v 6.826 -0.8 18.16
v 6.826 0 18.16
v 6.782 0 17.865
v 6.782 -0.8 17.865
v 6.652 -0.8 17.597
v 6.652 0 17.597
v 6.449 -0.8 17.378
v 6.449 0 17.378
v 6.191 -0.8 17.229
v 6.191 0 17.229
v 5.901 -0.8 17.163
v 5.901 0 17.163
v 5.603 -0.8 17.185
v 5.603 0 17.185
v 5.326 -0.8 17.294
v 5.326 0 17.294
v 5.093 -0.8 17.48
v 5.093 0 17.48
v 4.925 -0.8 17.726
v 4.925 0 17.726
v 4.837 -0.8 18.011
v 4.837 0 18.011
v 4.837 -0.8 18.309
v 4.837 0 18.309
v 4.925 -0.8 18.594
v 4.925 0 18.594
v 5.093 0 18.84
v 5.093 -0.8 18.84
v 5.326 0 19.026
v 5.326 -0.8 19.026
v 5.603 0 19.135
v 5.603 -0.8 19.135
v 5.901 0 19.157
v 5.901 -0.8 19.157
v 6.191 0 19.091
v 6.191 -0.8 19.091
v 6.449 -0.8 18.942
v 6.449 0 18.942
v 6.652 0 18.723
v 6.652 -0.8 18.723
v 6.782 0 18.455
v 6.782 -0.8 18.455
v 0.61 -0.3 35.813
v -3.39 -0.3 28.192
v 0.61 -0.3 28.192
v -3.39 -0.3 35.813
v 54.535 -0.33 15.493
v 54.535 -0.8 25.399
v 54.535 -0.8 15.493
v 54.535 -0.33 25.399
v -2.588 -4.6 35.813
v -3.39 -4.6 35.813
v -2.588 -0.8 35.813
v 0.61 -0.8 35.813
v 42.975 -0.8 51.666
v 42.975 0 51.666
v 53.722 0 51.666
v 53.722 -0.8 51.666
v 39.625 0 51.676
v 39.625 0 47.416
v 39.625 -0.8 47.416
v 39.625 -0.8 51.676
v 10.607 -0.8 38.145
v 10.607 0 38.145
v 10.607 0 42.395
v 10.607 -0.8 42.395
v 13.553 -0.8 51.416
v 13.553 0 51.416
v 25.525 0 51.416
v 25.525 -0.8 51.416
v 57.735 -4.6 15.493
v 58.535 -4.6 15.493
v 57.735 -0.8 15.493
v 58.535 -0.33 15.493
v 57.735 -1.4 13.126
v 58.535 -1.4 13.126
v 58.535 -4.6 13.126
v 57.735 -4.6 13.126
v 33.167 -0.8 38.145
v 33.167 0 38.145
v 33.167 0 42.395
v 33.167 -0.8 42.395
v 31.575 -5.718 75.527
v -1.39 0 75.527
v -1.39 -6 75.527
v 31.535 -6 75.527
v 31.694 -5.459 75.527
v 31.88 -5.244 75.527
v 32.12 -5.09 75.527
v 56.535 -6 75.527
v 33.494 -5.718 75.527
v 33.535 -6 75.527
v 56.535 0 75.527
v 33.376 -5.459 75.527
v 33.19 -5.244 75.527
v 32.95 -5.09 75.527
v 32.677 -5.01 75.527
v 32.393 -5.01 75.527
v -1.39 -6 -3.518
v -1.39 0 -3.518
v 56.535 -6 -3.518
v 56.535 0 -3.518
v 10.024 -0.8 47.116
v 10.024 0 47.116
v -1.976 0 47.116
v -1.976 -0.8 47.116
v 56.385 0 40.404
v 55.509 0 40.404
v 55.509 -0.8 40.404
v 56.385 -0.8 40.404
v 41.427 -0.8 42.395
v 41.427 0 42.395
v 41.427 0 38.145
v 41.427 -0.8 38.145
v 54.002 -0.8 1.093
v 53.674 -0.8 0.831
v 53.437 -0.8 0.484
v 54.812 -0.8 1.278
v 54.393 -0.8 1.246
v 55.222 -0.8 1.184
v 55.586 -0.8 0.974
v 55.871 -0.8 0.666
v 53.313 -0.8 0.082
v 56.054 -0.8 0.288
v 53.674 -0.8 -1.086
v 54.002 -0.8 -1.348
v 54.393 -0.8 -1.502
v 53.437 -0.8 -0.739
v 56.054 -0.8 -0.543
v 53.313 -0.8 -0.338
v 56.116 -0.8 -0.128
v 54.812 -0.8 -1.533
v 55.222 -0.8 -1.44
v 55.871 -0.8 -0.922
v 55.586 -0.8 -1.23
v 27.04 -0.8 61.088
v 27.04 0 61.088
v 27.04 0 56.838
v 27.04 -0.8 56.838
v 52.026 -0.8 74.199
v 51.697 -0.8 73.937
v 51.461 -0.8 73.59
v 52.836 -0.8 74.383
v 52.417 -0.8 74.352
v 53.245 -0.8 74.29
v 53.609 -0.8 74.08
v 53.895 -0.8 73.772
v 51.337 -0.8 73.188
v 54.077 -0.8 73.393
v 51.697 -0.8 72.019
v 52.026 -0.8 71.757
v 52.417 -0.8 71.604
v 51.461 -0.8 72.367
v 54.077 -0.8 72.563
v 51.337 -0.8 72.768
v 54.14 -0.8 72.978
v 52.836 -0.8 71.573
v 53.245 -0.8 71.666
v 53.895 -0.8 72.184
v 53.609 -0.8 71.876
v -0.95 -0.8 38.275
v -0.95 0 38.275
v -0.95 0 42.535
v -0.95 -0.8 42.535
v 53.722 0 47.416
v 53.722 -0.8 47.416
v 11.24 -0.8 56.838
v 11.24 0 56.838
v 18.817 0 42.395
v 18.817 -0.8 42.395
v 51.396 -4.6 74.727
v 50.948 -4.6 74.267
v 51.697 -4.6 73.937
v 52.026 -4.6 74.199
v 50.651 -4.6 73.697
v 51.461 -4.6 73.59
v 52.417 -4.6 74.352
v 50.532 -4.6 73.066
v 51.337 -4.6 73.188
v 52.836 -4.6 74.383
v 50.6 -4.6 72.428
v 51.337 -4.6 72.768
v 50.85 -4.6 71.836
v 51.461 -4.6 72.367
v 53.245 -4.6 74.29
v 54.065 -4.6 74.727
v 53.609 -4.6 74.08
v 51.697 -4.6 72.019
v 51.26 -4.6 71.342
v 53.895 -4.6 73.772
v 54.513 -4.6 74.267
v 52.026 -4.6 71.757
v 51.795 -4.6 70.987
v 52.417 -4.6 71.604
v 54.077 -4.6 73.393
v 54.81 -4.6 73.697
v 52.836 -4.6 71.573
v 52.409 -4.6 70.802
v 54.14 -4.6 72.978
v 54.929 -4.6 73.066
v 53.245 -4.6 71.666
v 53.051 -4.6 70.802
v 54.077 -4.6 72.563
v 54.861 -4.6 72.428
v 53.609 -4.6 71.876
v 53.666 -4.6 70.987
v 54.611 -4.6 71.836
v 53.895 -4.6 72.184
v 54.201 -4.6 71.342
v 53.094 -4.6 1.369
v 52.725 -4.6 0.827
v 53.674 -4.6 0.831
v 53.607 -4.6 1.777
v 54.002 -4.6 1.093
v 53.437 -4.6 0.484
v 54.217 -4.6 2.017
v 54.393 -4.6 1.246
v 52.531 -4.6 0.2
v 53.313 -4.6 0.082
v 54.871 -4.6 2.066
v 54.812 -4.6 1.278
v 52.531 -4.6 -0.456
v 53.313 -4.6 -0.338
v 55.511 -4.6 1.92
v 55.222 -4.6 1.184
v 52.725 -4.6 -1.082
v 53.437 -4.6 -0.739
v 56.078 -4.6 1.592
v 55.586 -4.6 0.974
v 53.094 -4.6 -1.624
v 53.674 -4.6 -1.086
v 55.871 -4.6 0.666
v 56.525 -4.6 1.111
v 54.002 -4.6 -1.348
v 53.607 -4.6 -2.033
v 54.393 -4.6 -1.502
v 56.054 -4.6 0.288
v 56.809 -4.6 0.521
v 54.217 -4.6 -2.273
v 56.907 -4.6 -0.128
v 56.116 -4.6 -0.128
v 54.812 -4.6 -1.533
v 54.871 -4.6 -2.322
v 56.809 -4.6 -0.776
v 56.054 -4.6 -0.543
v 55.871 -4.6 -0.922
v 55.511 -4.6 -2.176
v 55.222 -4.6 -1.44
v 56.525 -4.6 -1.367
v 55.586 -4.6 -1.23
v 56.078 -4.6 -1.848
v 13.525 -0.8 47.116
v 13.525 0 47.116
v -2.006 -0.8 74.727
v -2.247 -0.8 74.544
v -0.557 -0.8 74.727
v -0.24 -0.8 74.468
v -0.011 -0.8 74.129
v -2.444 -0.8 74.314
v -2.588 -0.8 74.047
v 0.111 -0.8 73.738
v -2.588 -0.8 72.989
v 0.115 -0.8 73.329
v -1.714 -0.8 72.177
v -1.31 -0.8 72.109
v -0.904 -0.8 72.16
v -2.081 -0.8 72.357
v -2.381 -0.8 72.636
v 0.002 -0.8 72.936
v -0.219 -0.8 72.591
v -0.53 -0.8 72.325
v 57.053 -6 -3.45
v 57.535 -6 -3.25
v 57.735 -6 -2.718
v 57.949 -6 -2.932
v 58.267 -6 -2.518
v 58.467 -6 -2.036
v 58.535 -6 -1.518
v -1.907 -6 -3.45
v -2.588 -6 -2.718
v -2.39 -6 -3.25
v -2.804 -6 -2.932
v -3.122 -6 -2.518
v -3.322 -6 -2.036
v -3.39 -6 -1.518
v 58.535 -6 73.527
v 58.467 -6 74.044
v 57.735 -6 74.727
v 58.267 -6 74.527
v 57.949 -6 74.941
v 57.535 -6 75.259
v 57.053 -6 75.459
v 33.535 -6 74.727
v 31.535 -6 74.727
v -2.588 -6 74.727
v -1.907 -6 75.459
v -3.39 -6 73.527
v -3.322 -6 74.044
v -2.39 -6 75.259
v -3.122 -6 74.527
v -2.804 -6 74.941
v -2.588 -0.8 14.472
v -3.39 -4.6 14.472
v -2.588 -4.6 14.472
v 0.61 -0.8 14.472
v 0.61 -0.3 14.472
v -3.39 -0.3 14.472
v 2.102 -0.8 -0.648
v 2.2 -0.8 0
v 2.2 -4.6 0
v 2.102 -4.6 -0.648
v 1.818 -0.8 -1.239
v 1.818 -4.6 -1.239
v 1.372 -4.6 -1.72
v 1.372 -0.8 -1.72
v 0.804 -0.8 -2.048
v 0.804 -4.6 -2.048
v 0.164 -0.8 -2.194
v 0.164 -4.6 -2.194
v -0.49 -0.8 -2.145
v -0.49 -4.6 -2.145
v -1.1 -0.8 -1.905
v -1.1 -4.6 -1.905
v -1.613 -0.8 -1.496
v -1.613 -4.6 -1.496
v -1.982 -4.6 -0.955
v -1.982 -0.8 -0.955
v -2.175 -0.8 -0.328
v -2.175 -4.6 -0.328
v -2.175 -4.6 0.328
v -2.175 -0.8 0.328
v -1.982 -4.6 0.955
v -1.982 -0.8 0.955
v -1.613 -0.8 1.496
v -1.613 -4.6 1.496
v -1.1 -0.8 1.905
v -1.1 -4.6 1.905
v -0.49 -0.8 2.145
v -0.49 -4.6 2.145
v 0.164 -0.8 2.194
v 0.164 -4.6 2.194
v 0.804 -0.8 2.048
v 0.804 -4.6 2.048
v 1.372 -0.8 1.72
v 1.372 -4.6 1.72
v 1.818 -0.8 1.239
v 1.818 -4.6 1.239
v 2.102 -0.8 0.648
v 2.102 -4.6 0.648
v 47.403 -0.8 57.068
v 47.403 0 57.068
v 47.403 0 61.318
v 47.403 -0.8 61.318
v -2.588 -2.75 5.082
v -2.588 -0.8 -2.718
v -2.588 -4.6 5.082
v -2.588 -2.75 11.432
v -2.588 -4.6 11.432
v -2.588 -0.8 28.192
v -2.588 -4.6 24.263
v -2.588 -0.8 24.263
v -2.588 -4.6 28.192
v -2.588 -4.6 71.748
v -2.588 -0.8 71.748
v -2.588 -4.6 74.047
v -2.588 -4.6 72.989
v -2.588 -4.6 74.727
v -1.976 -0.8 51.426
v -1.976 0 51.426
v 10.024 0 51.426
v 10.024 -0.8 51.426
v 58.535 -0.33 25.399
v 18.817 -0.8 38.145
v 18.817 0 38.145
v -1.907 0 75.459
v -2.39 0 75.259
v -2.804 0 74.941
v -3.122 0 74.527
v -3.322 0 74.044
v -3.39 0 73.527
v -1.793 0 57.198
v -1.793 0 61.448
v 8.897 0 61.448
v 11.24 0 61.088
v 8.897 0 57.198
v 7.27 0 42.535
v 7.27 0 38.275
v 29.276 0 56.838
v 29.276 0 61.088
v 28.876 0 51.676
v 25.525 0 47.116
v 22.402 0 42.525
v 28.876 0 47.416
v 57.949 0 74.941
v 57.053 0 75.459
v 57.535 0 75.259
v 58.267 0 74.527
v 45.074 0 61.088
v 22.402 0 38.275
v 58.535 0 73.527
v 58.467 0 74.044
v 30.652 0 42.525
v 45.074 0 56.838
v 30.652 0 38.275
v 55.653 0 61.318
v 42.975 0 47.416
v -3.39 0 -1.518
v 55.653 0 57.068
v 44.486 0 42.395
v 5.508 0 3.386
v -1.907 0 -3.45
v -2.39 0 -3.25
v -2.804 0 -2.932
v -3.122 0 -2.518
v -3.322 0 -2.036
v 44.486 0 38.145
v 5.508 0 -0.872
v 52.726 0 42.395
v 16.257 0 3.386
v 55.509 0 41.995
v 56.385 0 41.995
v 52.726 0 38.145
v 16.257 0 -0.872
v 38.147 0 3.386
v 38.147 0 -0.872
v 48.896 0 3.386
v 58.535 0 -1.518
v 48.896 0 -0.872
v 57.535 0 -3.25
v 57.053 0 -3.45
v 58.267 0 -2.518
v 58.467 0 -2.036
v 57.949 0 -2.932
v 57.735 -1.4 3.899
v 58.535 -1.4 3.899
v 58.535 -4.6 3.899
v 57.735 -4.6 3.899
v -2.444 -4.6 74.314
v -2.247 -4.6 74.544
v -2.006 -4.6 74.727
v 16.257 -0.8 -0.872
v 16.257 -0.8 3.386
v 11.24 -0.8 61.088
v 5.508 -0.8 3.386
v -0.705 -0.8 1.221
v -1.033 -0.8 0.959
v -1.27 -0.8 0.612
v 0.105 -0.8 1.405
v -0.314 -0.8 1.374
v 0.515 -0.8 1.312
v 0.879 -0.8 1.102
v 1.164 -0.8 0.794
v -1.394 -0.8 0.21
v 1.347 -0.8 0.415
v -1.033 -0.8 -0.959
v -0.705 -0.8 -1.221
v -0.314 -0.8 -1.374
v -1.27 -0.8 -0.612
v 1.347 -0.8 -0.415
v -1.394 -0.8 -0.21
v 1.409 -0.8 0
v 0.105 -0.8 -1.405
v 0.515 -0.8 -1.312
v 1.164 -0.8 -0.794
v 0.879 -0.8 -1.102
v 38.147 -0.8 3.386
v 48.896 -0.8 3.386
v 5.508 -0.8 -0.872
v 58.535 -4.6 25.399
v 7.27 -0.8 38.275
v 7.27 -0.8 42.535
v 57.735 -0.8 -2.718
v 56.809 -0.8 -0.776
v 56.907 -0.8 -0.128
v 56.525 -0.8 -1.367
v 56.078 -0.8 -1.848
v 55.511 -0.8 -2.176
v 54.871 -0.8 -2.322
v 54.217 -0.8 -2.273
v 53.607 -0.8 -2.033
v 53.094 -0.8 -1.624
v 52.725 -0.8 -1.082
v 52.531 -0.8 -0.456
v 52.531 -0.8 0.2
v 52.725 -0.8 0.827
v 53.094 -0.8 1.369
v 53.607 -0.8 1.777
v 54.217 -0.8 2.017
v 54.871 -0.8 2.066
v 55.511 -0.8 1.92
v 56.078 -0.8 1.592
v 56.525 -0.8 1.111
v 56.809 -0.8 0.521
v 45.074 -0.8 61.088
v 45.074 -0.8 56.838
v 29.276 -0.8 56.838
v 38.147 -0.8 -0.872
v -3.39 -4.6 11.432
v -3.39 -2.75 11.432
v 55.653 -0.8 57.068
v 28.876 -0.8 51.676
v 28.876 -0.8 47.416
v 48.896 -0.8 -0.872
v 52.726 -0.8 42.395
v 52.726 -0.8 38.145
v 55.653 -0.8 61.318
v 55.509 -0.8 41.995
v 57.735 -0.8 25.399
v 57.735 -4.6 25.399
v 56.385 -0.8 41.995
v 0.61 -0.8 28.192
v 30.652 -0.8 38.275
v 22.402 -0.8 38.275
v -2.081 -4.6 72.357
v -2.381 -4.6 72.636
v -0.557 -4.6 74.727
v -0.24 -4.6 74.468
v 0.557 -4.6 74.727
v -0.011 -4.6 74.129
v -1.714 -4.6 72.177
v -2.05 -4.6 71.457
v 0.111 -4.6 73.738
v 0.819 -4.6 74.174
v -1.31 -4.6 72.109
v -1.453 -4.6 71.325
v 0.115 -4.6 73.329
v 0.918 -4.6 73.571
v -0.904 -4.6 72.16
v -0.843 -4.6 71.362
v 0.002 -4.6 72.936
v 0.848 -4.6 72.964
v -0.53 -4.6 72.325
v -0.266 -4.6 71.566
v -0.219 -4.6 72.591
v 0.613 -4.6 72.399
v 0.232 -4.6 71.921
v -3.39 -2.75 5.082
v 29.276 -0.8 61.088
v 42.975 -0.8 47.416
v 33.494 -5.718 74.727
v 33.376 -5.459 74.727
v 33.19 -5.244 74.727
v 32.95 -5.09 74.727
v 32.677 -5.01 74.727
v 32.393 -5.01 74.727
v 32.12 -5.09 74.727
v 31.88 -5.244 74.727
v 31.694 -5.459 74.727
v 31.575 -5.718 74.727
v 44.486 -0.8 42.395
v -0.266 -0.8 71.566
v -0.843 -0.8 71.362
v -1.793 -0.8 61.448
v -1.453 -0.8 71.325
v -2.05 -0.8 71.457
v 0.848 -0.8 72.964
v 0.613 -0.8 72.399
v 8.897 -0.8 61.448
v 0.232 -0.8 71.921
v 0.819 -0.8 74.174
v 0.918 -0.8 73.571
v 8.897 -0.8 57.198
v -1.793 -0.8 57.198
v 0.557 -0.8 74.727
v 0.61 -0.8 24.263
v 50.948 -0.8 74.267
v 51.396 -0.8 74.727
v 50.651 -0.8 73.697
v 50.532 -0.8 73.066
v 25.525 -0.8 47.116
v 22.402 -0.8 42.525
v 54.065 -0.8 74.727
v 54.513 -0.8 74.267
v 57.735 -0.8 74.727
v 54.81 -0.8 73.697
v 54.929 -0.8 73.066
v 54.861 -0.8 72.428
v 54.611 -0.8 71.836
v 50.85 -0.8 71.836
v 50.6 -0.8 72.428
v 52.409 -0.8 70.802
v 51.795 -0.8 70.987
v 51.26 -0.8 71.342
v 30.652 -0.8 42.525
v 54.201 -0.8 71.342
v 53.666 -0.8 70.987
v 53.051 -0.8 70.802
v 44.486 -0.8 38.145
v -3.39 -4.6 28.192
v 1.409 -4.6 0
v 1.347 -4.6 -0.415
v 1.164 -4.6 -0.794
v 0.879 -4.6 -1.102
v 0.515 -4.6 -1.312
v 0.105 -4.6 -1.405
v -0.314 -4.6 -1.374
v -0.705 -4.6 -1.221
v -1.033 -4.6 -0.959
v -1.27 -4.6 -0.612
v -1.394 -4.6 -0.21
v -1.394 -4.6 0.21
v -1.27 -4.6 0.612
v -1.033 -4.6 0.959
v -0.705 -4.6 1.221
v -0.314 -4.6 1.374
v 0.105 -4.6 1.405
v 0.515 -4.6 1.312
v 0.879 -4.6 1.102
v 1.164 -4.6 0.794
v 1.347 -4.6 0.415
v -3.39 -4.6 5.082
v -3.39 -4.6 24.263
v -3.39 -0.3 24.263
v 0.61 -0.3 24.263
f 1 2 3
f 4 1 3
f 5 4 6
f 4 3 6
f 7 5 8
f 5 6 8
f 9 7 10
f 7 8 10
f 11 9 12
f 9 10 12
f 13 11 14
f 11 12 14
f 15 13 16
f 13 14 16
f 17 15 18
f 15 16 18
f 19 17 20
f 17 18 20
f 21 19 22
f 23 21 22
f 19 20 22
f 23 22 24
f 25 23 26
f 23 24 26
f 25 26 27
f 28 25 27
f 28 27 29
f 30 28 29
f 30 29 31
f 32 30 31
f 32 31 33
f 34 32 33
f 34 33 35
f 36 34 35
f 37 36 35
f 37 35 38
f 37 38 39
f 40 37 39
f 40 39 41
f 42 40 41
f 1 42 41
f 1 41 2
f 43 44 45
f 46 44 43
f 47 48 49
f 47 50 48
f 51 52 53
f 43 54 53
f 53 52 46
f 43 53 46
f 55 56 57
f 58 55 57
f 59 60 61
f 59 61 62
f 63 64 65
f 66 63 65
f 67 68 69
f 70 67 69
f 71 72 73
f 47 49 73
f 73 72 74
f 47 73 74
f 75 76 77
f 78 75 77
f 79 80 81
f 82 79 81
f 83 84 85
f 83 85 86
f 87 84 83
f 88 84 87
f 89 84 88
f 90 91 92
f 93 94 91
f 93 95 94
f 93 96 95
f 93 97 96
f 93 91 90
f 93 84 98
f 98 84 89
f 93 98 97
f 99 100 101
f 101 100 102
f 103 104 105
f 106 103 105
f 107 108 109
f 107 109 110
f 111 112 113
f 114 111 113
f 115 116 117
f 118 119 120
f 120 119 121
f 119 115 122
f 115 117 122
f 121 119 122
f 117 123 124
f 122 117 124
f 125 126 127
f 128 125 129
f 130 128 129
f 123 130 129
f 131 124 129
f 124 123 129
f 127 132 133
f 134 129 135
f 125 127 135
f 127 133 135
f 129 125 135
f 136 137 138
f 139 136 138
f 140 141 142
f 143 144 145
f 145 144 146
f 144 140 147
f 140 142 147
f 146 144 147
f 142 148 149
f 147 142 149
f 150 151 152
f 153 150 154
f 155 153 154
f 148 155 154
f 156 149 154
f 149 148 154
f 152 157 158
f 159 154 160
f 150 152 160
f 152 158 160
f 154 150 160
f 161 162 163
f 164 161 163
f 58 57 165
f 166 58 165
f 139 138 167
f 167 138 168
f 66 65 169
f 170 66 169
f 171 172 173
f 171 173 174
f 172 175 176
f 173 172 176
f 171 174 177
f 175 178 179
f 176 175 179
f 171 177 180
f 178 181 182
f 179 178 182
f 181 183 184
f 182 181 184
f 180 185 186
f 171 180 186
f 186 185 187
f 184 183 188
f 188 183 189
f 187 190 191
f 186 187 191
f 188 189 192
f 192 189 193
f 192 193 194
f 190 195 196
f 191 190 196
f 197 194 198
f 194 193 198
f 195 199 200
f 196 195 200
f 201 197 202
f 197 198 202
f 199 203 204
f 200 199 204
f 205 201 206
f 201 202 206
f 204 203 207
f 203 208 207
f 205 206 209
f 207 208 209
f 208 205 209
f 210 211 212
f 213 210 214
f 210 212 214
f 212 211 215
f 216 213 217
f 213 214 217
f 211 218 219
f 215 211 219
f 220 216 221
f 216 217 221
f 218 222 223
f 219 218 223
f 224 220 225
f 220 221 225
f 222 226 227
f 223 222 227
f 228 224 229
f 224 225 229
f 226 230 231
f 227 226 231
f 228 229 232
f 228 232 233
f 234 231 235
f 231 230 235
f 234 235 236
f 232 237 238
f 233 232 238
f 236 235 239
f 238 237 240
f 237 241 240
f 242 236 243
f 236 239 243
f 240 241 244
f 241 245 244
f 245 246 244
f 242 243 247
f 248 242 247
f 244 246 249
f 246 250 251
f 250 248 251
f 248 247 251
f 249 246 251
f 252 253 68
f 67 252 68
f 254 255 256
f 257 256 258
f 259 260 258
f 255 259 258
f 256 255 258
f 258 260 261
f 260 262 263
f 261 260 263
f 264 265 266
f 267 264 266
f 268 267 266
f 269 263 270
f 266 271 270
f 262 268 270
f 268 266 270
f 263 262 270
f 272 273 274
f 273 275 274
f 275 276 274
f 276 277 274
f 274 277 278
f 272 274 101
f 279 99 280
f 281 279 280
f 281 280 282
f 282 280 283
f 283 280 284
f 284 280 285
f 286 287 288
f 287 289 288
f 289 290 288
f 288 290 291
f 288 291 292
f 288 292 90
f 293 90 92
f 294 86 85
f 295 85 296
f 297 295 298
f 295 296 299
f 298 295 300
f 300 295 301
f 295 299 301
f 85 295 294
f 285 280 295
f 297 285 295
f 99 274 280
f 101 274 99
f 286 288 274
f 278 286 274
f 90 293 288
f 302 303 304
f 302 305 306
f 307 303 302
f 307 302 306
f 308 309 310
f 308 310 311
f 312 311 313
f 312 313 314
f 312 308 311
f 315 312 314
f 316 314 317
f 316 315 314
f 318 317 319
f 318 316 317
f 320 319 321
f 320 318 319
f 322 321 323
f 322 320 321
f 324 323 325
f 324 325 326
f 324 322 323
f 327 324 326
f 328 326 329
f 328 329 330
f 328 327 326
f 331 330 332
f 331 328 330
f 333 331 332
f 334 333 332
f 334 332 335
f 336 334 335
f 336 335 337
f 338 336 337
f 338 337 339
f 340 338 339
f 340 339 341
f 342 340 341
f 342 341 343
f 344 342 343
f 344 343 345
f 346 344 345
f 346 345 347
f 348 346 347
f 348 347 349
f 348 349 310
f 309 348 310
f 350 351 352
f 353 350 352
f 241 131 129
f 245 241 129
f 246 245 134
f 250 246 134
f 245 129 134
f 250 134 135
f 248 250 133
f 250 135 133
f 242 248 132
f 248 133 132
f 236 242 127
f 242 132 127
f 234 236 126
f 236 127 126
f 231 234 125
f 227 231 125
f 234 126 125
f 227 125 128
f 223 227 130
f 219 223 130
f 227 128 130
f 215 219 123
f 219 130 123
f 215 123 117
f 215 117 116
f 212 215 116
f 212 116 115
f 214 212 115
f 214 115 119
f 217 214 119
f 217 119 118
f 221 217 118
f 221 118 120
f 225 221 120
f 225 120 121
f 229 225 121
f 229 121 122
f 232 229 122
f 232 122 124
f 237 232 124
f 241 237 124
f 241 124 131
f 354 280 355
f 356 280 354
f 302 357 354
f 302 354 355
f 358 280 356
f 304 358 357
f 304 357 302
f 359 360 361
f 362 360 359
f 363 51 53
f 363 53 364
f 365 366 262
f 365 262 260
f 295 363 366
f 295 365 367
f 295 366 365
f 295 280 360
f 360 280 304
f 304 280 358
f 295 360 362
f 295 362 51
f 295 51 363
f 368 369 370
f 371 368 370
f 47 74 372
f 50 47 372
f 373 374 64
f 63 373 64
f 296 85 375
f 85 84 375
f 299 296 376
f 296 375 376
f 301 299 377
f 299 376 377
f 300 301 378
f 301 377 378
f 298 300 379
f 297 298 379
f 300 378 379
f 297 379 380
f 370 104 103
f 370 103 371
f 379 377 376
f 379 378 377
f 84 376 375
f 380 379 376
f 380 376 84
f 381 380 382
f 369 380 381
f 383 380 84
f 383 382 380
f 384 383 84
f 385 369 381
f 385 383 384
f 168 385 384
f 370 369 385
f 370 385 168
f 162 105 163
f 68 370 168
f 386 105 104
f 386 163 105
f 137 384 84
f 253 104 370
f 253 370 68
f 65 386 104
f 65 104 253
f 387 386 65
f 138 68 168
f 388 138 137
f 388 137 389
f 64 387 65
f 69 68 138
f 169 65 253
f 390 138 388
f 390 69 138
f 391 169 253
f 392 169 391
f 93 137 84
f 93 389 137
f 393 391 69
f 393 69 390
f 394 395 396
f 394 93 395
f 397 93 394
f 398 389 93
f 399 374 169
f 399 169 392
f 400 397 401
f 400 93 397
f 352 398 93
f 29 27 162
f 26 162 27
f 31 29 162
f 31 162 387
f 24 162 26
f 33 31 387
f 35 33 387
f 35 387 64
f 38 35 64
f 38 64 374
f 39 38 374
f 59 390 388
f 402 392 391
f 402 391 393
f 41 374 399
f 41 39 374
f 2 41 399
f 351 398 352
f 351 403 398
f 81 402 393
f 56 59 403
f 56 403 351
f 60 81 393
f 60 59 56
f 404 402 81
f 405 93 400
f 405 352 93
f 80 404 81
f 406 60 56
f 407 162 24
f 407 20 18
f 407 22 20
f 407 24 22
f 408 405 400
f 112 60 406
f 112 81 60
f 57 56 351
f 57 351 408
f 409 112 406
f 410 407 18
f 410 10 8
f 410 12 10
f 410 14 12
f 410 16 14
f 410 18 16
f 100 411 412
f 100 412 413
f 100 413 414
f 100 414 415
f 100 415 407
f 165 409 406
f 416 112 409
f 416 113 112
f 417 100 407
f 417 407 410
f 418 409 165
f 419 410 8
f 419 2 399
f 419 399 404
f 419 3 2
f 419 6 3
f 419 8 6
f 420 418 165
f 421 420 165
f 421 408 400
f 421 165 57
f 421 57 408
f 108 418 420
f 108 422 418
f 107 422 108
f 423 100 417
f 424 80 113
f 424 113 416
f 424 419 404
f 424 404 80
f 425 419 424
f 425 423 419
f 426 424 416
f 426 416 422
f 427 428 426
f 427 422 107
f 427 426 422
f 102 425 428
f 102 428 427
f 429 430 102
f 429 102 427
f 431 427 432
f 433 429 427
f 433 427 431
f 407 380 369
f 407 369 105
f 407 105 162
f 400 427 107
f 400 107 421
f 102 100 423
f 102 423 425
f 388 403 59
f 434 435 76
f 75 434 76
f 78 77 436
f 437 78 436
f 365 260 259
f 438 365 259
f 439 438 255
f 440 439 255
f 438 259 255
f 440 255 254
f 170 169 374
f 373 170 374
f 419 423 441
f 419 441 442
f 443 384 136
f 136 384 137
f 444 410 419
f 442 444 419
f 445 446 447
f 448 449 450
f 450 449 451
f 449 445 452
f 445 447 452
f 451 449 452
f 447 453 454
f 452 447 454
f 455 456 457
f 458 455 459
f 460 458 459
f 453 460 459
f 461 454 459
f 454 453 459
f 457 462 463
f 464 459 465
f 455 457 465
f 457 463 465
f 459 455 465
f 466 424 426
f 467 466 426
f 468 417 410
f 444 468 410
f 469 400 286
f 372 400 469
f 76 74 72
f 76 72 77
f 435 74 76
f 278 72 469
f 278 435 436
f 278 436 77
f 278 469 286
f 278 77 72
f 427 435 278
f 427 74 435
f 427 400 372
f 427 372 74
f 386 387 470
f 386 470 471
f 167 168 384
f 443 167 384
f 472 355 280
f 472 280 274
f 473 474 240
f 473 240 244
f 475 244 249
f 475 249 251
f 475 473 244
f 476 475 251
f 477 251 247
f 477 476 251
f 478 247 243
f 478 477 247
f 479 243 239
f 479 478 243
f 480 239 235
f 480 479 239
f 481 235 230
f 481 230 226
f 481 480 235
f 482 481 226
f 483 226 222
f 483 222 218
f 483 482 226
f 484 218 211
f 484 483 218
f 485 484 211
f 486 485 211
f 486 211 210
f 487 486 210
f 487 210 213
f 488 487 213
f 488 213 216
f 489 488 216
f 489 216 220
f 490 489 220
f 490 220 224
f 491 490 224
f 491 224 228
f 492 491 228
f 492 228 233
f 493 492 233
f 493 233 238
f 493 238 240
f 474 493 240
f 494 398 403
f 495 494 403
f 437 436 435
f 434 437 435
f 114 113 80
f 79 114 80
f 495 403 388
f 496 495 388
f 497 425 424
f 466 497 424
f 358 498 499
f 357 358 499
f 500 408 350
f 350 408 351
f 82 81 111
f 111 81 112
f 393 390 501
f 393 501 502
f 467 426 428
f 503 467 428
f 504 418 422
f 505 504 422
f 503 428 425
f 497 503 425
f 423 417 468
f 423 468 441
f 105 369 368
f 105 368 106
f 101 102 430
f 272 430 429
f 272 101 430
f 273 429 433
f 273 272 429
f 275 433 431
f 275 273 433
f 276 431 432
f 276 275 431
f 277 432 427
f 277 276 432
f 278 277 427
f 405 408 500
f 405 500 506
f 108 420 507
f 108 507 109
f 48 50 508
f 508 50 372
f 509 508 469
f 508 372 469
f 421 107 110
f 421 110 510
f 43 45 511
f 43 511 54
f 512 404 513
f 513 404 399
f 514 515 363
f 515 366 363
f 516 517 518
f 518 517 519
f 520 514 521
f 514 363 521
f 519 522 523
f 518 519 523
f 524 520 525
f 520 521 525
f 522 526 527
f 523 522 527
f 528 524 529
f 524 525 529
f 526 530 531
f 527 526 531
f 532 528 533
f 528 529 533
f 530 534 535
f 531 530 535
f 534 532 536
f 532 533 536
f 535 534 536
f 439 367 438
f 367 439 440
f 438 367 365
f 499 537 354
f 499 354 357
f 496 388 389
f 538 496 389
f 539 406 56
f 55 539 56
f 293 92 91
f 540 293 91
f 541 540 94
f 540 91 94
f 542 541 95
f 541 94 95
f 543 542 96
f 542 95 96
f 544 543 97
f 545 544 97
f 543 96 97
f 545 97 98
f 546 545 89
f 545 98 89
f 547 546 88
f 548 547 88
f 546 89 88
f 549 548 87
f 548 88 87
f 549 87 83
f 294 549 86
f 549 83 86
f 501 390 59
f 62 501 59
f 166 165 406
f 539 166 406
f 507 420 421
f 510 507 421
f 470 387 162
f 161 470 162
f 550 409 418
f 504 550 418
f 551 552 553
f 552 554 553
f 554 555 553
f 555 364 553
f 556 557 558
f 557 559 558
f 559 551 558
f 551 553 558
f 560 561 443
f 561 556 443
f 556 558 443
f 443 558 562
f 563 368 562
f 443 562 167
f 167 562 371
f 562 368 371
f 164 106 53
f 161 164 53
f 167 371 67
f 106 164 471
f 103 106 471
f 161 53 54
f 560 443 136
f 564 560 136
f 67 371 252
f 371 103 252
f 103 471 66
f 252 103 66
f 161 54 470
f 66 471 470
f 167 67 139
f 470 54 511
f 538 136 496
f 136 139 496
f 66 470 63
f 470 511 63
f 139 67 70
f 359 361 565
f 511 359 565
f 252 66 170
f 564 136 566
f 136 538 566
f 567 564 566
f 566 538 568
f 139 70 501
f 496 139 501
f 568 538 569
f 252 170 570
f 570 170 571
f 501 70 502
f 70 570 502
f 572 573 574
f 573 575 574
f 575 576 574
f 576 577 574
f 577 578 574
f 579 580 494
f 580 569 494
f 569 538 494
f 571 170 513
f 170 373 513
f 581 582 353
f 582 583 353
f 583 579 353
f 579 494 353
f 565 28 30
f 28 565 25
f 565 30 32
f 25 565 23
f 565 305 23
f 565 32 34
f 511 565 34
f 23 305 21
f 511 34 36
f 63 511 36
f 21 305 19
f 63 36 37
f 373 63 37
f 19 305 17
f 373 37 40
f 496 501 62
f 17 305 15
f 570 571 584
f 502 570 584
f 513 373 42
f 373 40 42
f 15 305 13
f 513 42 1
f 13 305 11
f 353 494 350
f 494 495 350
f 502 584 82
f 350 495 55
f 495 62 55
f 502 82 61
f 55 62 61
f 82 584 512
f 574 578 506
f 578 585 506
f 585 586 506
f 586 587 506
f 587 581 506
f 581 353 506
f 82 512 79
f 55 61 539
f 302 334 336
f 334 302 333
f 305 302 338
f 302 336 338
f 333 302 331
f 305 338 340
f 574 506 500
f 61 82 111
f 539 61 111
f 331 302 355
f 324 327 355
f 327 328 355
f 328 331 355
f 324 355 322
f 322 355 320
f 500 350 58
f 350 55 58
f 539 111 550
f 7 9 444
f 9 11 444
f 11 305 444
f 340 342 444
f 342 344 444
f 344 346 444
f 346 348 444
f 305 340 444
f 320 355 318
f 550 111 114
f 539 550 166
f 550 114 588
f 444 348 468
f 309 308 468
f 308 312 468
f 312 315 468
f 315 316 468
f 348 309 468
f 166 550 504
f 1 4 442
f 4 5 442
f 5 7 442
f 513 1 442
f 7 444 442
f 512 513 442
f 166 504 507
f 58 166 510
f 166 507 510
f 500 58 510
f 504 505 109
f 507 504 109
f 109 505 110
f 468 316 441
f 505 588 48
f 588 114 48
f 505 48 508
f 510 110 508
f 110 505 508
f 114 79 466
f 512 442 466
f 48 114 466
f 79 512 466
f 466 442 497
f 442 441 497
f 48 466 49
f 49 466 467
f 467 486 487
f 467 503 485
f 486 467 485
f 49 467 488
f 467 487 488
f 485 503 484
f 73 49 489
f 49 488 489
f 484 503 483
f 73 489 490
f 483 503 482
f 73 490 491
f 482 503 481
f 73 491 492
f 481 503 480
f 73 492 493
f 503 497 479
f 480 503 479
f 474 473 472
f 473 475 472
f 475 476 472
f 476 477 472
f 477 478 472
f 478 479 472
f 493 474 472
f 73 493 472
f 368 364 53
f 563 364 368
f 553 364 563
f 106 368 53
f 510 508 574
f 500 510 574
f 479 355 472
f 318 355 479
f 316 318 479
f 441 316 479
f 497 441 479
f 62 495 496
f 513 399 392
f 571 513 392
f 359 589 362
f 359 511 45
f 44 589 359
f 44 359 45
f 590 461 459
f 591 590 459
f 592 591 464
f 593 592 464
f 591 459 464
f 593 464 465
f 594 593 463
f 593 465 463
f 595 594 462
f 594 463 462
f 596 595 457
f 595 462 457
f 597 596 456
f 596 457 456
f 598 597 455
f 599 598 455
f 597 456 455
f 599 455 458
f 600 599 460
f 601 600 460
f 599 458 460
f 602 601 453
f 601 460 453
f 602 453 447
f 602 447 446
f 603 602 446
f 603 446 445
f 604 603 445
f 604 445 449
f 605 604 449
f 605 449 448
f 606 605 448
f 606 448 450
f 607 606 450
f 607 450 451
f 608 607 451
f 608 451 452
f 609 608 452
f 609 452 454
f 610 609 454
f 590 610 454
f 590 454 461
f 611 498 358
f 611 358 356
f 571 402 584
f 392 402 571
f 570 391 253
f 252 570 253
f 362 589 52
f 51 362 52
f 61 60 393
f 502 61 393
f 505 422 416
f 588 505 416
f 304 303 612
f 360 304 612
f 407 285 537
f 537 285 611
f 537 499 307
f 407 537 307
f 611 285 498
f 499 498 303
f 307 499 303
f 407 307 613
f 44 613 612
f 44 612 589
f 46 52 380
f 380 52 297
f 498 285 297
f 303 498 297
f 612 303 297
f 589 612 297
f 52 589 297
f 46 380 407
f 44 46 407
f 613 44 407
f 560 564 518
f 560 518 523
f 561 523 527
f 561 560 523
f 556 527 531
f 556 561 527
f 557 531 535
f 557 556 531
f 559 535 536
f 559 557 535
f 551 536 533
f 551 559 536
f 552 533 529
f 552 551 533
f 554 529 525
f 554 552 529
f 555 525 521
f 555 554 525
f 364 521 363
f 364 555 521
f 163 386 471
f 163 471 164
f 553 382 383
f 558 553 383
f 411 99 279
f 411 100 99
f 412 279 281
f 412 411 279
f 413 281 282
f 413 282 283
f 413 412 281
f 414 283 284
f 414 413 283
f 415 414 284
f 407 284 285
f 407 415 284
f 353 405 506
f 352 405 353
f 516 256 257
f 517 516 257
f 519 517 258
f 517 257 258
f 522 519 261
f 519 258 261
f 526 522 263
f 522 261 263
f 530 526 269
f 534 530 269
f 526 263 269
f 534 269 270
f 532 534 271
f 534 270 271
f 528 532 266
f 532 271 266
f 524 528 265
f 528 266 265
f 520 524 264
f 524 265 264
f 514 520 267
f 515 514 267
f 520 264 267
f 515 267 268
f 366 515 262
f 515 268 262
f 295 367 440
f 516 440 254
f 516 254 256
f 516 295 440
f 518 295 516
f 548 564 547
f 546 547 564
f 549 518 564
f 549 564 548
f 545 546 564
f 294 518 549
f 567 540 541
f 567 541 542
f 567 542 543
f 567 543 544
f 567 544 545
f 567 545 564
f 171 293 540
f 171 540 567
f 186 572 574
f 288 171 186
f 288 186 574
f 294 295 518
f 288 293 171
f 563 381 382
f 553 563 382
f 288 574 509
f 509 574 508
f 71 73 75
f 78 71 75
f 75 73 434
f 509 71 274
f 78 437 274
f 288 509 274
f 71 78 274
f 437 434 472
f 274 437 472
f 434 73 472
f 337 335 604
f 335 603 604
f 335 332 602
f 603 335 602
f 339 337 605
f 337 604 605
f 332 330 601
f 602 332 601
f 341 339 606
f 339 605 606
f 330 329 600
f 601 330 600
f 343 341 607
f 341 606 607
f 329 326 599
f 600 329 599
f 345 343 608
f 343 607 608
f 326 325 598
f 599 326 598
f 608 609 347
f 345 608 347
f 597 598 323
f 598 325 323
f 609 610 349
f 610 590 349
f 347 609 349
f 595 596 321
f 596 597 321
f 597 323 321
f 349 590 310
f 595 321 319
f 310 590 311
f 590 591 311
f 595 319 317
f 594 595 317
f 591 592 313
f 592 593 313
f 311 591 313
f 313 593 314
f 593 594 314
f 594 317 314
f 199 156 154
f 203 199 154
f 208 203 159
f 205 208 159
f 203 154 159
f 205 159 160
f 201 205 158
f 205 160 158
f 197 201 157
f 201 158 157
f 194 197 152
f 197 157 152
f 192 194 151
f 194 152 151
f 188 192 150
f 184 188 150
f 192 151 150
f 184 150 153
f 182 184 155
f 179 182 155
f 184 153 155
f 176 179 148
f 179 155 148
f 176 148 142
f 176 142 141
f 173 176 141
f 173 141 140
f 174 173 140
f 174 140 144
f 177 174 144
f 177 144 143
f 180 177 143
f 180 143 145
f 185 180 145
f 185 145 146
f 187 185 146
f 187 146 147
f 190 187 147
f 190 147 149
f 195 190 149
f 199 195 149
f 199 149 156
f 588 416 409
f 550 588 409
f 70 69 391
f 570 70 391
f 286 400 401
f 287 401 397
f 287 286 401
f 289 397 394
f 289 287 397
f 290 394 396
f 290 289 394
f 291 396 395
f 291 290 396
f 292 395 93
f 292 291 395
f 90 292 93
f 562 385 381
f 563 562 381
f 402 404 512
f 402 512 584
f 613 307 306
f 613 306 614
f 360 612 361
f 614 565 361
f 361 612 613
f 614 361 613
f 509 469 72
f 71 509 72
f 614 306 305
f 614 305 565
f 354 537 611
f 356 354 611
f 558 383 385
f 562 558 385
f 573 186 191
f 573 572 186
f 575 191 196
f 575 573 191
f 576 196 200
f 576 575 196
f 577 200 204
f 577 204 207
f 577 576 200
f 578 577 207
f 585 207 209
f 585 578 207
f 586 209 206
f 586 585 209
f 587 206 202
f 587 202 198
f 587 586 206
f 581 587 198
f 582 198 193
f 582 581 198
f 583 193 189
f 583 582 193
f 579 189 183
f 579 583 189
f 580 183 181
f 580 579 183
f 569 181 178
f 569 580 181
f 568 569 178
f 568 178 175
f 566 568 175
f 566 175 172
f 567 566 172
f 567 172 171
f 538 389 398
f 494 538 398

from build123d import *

# Parameters (mm, degrees)
SKETCH3_W            = 62.732633811
SKETCH3_H            = 79.574938689
SKETCH3_W_2          = 61.132633811
SKETCH3_H_2          = 77.974938689
BOSS_EXTRUDE8_DEPTH  = 6
SKETCH2_R            = 2.2
SKETCH2_R_2          = 1.409397898
BOSS_EXTRUDE9_DEPTH  = 4.6
SKETCH4_W            = 61.132633811
SKETCH4_H            = 77.974938689
BOSS_EXTRUDE11_DEPTH = 0.8
CUT_EXTRUDE2_DEPTH   = 4
SKETCH8_W            = 6.35
SKETCH8_H            = 1.7
SKETCH8_W_2          = 9.791634441
SKETCH8_H_2          = 4.4
SKETCH8_W_3          = 7.621
CUT_EXTRUDE3_DEPTH   = 1
SKETCH10_R           = 1
CUT_EXTRUDE4_DEPTH   = 10
SKETCH11_W           = 62.732633811
SKETCH11_H           = 0.53
CUT_EXTRUDE5_DEPTH   = 10
SKETCH12_W           = 61.132633811
SKETCH12_H           = 0.529997491
BOSS_EXTRUDE12_DEPTH = 6
BOSS_EXTRUDE14_DEPTH = 6
SKETCH16_W           = 0.807943928
SKETCH16_H           = 79.044938689
CUT_EXTRUDE6_DEPTH   = 10
CUT_EXTRUDE7_DEPTH   = 10
SKETCH20_W           = 9.7916
SKETCH20_H           = 4.3
SKETCH20_W_2         = 7.621
CUT_EXTRUDE9_DEPTH   = 4
FILLET1_R            = 2


with BuildPart() as part:
    # Sketch3 → Boss-Extrude8 (new body)
    with BuildSketch(Plane(origin=(0, 0, 0), x_dir=(1, 0, 0), z_dir=(0, 1, 0))):
        with Locations((27.16866126, -36.269344827)):
            Rectangle(SKETCH3_W, SKETCH3_H)
        with Locations((27.16866126, -36.269344827)):
            Rectangle(SKETCH3_W_2, SKETCH3_H_2, mode=Mode.SUBTRACT)
    extrude(amount=-BOSS_EXTRUDE8_DEPTH)

    # Sketch2 → Boss-Extrude9 (add)
    with BuildSketch(Plane(origin=(0, 0, 0), x_dir=(1, 0, 0), z_dir=(0, 1, 0))):
        Circle(SKETCH2_R)
        Circle(SKETCH2_R_2, mode=Mode.SUBTRACT)
        with Locations((54.706786111, 0.127852524)):
            Circle(SKETCH2_R)
        with Locations((54.706786111, 0.127852524)):
            Circle(SKETCH2_R_2, mode=Mode.SUBTRACT)
        with Locations((52.730413392, -72.978026956)):
            Circle(SKETCH2_R)
        with Locations((52.730413392, -72.978026956)):
            Circle(SKETCH2_R_2, mode=Mode.SUBTRACT)
        with Locations((-1.28124336, -73.51791918)):
            Circle(SKETCH2_R)
        with Locations((-1.28124336, -73.51791918)):
            Circle(SKETCH2_R_2, mode=Mode.SUBTRACT)
    extrude(amount=-BOSS_EXTRUDE9_DEPTH)

    # Sketch4 → Boss-Extrude11 (add)
    with BuildSketch(Plane(origin=(0, 0, 0), x_dir=(1, 0, 0), z_dir=(0, 1, 0))):
        with Locations((27.16866126, -36.269344827)):
            Rectangle(SKETCH4_W, SKETCH4_H)
    extrude(amount=-BOSS_EXTRUDE11_DEPTH)

    # Sketch7 → Cut-Extrude2 (cut)
    with BuildSketch(Plane(origin=(58.534978165, 0, 0), x_dir=(0, 0, -1), z_dir=(1, 0, 0))):
        Polygon((-3.898875483, -4.6), (-3.898875483, -2.1), (-3.898875483, -1.5), (-3.898875483, -1.4), (-13.125875483, -1.4), (-13.125875483, -1.5), (-13.125875483, -2.1), (-13.125875483, -4.6), align=None)
        Polygon((-15.492875483, -4.6), (-15.492875483, -0.6), (-15.492875483, -0.33), (-25.398875483, -0.33), (-25.398875483, -0.6), (-25.398875483, -4.6), align=None)
    extrude(amount=-CUT_EXTRUDE2_DEPTH, mode=Mode.SUBTRACT)

    # Sketch8 → Cut-Extrude3 (cut)
    with BuildSketch(Plane.ZY.offset(4.197655646)):
        with Locations((8.256875483, -3.75)):
            Rectangle(SKETCH8_W, SKETCH8_H)
        with Locations((19.363058263, -2.4)):
            Rectangle(SKETCH8_W_2, SKETCH8_H_2)
        with Locations((32.006375483, -2.4)):
            Rectangle(SKETCH8_W_3, SKETCH8_H_2)
    extrude(amount=-CUT_EXTRUDE3_DEPTH, mode=Mode.SUBTRACT)

    # Sketch10 → Cut-Extrude4 (cut)
    with BuildSketch(Plane(origin=(0, 0, 0), x_dir=(1, 0, 0), z_dir=(0, 1, 0))):
        with Locations((5.825978165, -18.159875483)):
            Circle(SKETCH10_R)
        Polygon((44.485978165, -38.144875483), (44.485978165, -41.994875483), (44.485978165, -42.394875483), (52.725978165, -42.394875483), (52.725978165, -38.144875483), (52.365978165, -38.144875483), align=None)
        Polygon((33.166978165, -38.144875483), (33.166978165, -41.994875483), (33.166978165, -42.394875483), (41.426978165, -42.394875483), (41.426978165, -38.144875483), (41.046978165, -38.144875483), align=None)
        Polygon((22.401978165, -41.994875483), (22.401978165, -38.274875483), (30.291978165, -38.274875483), (30.651978165, -38.274875483), (30.651978165, -42.524875483), (22.401978165, -42.524875483), align=None)
        Polygon((10.606978165, -38.144875483), (10.606978165, -41.994875483), (10.606978165, -42.394875483), (18.816978165, -42.394875483), (18.816978165, -38.144875483), (18.456978165, -38.144875483), align=None)
        Polygon((-0.950021835, -41.994875483), (-0.950021835, -38.274875483), (6.899978165, -38.274875483), (7.269978165, -38.274875483), (7.269978165, -42.534875483), (-0.950021835, -42.534875483), align=None)
        Polygon((25.154978165, -47.115875483), (13.774978165, -47.115875483), (13.524978165, -47.115875483), (13.552673933, -51.415875483), (13.774978165, -51.415875483), (25.524978165, -51.415875483), (25.524978165, -47.115875483), align=None)
        Polygon((-1.756021835, -47.115875483), (9.663978165, -47.115875483), (10.023978165, -47.115875483), (10.023978165, -51.425875483), (-1.756021835, -51.425875483), (-1.976021835, -51.425875483), (-1.976021835, -47.115875483), align=None)
        Polygon((47.402978165, -57.067875483), (55.012978165, -57.067875483), (55.652978165, -57.067875483), (55.652978165, -61.317875483), (47.402978165, -61.317875483), (47.402978165, -60.917875483), align=None)
        Polygon((38.146978165, 0.382124517), (38.146978165, -3.385875483), (48.535978165, -3.385875483), (48.895978165, -3.385875483), (48.895978165, 0.872124517), (38.146978165, 0.872124517), align=None)
        Polygon((15.896978165, -3.385875483), (5.507978165, -3.385875483), (5.507978165, 0.382124517), (5.507978165, 0.872124517), (16.256978165, 0.872124517), (16.256978165, -3.385875483), align=None)
        Polygon((53.361978165, -47.415875483), (43.784978165, -47.415875483), (42.974978165, -47.415875483), (42.974978165, -51.665875483), (43.784978165, -51.665875483), (53.721978165, -51.665875483), (53.721978165, -47.415875483), align=None)
        Polygon((29.687978165, -47.415875483), (39.264978165, -47.415875483), (39.624978165, -47.415875483), (39.624978165, -51.675875483), (29.687978165, -51.675875483), (28.876408648, -51.675875483), (28.876408648, -47.415875483), align=None)
        Polygon((-1.793021835, -57.197875483), (-1.793021835, -60.917875483), (-1.793021835, -61.447875483), (8.896978165, -61.447875483), (8.896978165, -57.197875483), (8.706978165, -57.197875483), align=None)
        Polygon((29.275978165, -56.837875483), (29.275978165, -60.917875483), (29.275978165, -61.087875483), (45.073978165, -61.087875483), (45.073978165, -56.837875483), (44.753978165, -56.837875483), align=None)
        Polygon((11.239978165, -56.837875483), (11.239978165, -60.917875483), (11.239978165, -61.087875483), (27.039978165, -61.087875483), (27.039978165, -56.837875483), (26.719978165, -56.837875483), align=None)
        Polygon((56.285232814, -41.994875483), (55.509188938, -41.994875483), (55.509188938, -40.403875483), (56.385232814, -40.403875483), (56.385232814, -41.994875483), align=None)
    extrude(amount=-CUT_EXTRUDE4_DEPTH, mode=Mode.SUBTRACT)

    # Sketch11 → Cut-Extrude5 (cut)
    with BuildSketch(Plane(origin=(0, 0, 0), x_dir=(1, 0, 0), z_dir=(0, 1, 0))):
        with Locations((27.16866126, -75.791814172)):
            Rectangle(SKETCH11_W, SKETCH11_H)
    extrude(amount=-CUT_EXTRUDE5_DEPTH, mode=Mode.SUBTRACT)

    # Sketch12 → Boss-Extrude12 (add)
    with BuildSketch(Plane.XZ.offset(6)):
        with Locations((27.16866126, 74.991815427)):
            Rectangle(SKETCH12_W, SKETCH12_H)
    extrude(amount=-BOSS_EXTRUDE12_DEPTH)

    # Sketch15 → Boss-Extrude14 (add)
    with BuildSketch(Plane.XZ.offset(6)):
        Polygon((-3.397655646, 74.726816681), (-2.587655646, 74.726816681), (-2.587655646, -2.718124517), (-2.587655646, -3.518124517), (-3.397655646, -3.518124517), align=None)
    extrude(amount=-BOSS_EXTRUDE14_DEPTH)

    # Sketch16 → Cut-Extrude6 (cut)
    with BuildSketch(Plane.XZ.offset(6)):
        with Locations((-3.793683682, 36.004344827)):
            Rectangle(SKETCH16_W, SKETCH16_H)
    extrude(amount=-CUT_EXTRUDE6_DEPTH, mode=Mode.SUBTRACT)

    # Sketch17 → Cut-Extrude7 (cut)
    with BuildSketch(Plane.XY.offset(75.526814172)):
        with BuildLine():
            Line((31.534978165, -6), (33.534978165, -6))
            ThreePointArc((33.534978165, -6), (32.534978165, -5), (31.534978165, -6))
        make_face()
    extrude(amount=-CUT_EXTRUDE7_DEPTH, mode=Mode.SUBTRACT)

    # Sketch20 → Cut-Extrude9 (cut)
    with BuildSketch(Plane.ZY.offset(3.389711718)):
        Polygon((5.081875483, -4.6), (5.081875483, -2.9), (5.081875483, -2.75), (11.431875483, -2.75), (11.431875483, -2.9), (11.431875483, -4.6), align=None)
        with Locations((19.367675483, -2.45)):
            Rectangle(SKETCH20_W, SKETCH20_H)
        with Locations((32.002375483, -2.45)):
            Rectangle(SKETCH20_W_2, SKETCH20_H)
    extrude(amount=-CUT_EXTRUDE9_DEPTH, mode=Mode.SUBTRACT)

    # Fillet1
    fillet1_edges = [part.edges().sort_by_distance(p)[0] for p in [
        (58.534978165, -3, 75.526814172),
        (-3.389711718, -3, 75.526814172),
        (-3.389711718, -3, -3.518124517),
        (58.534978165, -3, -3.518124517),
    ]]
    fillet(fillet1_edges, radius=FILLET1_R)


solid = part.part
